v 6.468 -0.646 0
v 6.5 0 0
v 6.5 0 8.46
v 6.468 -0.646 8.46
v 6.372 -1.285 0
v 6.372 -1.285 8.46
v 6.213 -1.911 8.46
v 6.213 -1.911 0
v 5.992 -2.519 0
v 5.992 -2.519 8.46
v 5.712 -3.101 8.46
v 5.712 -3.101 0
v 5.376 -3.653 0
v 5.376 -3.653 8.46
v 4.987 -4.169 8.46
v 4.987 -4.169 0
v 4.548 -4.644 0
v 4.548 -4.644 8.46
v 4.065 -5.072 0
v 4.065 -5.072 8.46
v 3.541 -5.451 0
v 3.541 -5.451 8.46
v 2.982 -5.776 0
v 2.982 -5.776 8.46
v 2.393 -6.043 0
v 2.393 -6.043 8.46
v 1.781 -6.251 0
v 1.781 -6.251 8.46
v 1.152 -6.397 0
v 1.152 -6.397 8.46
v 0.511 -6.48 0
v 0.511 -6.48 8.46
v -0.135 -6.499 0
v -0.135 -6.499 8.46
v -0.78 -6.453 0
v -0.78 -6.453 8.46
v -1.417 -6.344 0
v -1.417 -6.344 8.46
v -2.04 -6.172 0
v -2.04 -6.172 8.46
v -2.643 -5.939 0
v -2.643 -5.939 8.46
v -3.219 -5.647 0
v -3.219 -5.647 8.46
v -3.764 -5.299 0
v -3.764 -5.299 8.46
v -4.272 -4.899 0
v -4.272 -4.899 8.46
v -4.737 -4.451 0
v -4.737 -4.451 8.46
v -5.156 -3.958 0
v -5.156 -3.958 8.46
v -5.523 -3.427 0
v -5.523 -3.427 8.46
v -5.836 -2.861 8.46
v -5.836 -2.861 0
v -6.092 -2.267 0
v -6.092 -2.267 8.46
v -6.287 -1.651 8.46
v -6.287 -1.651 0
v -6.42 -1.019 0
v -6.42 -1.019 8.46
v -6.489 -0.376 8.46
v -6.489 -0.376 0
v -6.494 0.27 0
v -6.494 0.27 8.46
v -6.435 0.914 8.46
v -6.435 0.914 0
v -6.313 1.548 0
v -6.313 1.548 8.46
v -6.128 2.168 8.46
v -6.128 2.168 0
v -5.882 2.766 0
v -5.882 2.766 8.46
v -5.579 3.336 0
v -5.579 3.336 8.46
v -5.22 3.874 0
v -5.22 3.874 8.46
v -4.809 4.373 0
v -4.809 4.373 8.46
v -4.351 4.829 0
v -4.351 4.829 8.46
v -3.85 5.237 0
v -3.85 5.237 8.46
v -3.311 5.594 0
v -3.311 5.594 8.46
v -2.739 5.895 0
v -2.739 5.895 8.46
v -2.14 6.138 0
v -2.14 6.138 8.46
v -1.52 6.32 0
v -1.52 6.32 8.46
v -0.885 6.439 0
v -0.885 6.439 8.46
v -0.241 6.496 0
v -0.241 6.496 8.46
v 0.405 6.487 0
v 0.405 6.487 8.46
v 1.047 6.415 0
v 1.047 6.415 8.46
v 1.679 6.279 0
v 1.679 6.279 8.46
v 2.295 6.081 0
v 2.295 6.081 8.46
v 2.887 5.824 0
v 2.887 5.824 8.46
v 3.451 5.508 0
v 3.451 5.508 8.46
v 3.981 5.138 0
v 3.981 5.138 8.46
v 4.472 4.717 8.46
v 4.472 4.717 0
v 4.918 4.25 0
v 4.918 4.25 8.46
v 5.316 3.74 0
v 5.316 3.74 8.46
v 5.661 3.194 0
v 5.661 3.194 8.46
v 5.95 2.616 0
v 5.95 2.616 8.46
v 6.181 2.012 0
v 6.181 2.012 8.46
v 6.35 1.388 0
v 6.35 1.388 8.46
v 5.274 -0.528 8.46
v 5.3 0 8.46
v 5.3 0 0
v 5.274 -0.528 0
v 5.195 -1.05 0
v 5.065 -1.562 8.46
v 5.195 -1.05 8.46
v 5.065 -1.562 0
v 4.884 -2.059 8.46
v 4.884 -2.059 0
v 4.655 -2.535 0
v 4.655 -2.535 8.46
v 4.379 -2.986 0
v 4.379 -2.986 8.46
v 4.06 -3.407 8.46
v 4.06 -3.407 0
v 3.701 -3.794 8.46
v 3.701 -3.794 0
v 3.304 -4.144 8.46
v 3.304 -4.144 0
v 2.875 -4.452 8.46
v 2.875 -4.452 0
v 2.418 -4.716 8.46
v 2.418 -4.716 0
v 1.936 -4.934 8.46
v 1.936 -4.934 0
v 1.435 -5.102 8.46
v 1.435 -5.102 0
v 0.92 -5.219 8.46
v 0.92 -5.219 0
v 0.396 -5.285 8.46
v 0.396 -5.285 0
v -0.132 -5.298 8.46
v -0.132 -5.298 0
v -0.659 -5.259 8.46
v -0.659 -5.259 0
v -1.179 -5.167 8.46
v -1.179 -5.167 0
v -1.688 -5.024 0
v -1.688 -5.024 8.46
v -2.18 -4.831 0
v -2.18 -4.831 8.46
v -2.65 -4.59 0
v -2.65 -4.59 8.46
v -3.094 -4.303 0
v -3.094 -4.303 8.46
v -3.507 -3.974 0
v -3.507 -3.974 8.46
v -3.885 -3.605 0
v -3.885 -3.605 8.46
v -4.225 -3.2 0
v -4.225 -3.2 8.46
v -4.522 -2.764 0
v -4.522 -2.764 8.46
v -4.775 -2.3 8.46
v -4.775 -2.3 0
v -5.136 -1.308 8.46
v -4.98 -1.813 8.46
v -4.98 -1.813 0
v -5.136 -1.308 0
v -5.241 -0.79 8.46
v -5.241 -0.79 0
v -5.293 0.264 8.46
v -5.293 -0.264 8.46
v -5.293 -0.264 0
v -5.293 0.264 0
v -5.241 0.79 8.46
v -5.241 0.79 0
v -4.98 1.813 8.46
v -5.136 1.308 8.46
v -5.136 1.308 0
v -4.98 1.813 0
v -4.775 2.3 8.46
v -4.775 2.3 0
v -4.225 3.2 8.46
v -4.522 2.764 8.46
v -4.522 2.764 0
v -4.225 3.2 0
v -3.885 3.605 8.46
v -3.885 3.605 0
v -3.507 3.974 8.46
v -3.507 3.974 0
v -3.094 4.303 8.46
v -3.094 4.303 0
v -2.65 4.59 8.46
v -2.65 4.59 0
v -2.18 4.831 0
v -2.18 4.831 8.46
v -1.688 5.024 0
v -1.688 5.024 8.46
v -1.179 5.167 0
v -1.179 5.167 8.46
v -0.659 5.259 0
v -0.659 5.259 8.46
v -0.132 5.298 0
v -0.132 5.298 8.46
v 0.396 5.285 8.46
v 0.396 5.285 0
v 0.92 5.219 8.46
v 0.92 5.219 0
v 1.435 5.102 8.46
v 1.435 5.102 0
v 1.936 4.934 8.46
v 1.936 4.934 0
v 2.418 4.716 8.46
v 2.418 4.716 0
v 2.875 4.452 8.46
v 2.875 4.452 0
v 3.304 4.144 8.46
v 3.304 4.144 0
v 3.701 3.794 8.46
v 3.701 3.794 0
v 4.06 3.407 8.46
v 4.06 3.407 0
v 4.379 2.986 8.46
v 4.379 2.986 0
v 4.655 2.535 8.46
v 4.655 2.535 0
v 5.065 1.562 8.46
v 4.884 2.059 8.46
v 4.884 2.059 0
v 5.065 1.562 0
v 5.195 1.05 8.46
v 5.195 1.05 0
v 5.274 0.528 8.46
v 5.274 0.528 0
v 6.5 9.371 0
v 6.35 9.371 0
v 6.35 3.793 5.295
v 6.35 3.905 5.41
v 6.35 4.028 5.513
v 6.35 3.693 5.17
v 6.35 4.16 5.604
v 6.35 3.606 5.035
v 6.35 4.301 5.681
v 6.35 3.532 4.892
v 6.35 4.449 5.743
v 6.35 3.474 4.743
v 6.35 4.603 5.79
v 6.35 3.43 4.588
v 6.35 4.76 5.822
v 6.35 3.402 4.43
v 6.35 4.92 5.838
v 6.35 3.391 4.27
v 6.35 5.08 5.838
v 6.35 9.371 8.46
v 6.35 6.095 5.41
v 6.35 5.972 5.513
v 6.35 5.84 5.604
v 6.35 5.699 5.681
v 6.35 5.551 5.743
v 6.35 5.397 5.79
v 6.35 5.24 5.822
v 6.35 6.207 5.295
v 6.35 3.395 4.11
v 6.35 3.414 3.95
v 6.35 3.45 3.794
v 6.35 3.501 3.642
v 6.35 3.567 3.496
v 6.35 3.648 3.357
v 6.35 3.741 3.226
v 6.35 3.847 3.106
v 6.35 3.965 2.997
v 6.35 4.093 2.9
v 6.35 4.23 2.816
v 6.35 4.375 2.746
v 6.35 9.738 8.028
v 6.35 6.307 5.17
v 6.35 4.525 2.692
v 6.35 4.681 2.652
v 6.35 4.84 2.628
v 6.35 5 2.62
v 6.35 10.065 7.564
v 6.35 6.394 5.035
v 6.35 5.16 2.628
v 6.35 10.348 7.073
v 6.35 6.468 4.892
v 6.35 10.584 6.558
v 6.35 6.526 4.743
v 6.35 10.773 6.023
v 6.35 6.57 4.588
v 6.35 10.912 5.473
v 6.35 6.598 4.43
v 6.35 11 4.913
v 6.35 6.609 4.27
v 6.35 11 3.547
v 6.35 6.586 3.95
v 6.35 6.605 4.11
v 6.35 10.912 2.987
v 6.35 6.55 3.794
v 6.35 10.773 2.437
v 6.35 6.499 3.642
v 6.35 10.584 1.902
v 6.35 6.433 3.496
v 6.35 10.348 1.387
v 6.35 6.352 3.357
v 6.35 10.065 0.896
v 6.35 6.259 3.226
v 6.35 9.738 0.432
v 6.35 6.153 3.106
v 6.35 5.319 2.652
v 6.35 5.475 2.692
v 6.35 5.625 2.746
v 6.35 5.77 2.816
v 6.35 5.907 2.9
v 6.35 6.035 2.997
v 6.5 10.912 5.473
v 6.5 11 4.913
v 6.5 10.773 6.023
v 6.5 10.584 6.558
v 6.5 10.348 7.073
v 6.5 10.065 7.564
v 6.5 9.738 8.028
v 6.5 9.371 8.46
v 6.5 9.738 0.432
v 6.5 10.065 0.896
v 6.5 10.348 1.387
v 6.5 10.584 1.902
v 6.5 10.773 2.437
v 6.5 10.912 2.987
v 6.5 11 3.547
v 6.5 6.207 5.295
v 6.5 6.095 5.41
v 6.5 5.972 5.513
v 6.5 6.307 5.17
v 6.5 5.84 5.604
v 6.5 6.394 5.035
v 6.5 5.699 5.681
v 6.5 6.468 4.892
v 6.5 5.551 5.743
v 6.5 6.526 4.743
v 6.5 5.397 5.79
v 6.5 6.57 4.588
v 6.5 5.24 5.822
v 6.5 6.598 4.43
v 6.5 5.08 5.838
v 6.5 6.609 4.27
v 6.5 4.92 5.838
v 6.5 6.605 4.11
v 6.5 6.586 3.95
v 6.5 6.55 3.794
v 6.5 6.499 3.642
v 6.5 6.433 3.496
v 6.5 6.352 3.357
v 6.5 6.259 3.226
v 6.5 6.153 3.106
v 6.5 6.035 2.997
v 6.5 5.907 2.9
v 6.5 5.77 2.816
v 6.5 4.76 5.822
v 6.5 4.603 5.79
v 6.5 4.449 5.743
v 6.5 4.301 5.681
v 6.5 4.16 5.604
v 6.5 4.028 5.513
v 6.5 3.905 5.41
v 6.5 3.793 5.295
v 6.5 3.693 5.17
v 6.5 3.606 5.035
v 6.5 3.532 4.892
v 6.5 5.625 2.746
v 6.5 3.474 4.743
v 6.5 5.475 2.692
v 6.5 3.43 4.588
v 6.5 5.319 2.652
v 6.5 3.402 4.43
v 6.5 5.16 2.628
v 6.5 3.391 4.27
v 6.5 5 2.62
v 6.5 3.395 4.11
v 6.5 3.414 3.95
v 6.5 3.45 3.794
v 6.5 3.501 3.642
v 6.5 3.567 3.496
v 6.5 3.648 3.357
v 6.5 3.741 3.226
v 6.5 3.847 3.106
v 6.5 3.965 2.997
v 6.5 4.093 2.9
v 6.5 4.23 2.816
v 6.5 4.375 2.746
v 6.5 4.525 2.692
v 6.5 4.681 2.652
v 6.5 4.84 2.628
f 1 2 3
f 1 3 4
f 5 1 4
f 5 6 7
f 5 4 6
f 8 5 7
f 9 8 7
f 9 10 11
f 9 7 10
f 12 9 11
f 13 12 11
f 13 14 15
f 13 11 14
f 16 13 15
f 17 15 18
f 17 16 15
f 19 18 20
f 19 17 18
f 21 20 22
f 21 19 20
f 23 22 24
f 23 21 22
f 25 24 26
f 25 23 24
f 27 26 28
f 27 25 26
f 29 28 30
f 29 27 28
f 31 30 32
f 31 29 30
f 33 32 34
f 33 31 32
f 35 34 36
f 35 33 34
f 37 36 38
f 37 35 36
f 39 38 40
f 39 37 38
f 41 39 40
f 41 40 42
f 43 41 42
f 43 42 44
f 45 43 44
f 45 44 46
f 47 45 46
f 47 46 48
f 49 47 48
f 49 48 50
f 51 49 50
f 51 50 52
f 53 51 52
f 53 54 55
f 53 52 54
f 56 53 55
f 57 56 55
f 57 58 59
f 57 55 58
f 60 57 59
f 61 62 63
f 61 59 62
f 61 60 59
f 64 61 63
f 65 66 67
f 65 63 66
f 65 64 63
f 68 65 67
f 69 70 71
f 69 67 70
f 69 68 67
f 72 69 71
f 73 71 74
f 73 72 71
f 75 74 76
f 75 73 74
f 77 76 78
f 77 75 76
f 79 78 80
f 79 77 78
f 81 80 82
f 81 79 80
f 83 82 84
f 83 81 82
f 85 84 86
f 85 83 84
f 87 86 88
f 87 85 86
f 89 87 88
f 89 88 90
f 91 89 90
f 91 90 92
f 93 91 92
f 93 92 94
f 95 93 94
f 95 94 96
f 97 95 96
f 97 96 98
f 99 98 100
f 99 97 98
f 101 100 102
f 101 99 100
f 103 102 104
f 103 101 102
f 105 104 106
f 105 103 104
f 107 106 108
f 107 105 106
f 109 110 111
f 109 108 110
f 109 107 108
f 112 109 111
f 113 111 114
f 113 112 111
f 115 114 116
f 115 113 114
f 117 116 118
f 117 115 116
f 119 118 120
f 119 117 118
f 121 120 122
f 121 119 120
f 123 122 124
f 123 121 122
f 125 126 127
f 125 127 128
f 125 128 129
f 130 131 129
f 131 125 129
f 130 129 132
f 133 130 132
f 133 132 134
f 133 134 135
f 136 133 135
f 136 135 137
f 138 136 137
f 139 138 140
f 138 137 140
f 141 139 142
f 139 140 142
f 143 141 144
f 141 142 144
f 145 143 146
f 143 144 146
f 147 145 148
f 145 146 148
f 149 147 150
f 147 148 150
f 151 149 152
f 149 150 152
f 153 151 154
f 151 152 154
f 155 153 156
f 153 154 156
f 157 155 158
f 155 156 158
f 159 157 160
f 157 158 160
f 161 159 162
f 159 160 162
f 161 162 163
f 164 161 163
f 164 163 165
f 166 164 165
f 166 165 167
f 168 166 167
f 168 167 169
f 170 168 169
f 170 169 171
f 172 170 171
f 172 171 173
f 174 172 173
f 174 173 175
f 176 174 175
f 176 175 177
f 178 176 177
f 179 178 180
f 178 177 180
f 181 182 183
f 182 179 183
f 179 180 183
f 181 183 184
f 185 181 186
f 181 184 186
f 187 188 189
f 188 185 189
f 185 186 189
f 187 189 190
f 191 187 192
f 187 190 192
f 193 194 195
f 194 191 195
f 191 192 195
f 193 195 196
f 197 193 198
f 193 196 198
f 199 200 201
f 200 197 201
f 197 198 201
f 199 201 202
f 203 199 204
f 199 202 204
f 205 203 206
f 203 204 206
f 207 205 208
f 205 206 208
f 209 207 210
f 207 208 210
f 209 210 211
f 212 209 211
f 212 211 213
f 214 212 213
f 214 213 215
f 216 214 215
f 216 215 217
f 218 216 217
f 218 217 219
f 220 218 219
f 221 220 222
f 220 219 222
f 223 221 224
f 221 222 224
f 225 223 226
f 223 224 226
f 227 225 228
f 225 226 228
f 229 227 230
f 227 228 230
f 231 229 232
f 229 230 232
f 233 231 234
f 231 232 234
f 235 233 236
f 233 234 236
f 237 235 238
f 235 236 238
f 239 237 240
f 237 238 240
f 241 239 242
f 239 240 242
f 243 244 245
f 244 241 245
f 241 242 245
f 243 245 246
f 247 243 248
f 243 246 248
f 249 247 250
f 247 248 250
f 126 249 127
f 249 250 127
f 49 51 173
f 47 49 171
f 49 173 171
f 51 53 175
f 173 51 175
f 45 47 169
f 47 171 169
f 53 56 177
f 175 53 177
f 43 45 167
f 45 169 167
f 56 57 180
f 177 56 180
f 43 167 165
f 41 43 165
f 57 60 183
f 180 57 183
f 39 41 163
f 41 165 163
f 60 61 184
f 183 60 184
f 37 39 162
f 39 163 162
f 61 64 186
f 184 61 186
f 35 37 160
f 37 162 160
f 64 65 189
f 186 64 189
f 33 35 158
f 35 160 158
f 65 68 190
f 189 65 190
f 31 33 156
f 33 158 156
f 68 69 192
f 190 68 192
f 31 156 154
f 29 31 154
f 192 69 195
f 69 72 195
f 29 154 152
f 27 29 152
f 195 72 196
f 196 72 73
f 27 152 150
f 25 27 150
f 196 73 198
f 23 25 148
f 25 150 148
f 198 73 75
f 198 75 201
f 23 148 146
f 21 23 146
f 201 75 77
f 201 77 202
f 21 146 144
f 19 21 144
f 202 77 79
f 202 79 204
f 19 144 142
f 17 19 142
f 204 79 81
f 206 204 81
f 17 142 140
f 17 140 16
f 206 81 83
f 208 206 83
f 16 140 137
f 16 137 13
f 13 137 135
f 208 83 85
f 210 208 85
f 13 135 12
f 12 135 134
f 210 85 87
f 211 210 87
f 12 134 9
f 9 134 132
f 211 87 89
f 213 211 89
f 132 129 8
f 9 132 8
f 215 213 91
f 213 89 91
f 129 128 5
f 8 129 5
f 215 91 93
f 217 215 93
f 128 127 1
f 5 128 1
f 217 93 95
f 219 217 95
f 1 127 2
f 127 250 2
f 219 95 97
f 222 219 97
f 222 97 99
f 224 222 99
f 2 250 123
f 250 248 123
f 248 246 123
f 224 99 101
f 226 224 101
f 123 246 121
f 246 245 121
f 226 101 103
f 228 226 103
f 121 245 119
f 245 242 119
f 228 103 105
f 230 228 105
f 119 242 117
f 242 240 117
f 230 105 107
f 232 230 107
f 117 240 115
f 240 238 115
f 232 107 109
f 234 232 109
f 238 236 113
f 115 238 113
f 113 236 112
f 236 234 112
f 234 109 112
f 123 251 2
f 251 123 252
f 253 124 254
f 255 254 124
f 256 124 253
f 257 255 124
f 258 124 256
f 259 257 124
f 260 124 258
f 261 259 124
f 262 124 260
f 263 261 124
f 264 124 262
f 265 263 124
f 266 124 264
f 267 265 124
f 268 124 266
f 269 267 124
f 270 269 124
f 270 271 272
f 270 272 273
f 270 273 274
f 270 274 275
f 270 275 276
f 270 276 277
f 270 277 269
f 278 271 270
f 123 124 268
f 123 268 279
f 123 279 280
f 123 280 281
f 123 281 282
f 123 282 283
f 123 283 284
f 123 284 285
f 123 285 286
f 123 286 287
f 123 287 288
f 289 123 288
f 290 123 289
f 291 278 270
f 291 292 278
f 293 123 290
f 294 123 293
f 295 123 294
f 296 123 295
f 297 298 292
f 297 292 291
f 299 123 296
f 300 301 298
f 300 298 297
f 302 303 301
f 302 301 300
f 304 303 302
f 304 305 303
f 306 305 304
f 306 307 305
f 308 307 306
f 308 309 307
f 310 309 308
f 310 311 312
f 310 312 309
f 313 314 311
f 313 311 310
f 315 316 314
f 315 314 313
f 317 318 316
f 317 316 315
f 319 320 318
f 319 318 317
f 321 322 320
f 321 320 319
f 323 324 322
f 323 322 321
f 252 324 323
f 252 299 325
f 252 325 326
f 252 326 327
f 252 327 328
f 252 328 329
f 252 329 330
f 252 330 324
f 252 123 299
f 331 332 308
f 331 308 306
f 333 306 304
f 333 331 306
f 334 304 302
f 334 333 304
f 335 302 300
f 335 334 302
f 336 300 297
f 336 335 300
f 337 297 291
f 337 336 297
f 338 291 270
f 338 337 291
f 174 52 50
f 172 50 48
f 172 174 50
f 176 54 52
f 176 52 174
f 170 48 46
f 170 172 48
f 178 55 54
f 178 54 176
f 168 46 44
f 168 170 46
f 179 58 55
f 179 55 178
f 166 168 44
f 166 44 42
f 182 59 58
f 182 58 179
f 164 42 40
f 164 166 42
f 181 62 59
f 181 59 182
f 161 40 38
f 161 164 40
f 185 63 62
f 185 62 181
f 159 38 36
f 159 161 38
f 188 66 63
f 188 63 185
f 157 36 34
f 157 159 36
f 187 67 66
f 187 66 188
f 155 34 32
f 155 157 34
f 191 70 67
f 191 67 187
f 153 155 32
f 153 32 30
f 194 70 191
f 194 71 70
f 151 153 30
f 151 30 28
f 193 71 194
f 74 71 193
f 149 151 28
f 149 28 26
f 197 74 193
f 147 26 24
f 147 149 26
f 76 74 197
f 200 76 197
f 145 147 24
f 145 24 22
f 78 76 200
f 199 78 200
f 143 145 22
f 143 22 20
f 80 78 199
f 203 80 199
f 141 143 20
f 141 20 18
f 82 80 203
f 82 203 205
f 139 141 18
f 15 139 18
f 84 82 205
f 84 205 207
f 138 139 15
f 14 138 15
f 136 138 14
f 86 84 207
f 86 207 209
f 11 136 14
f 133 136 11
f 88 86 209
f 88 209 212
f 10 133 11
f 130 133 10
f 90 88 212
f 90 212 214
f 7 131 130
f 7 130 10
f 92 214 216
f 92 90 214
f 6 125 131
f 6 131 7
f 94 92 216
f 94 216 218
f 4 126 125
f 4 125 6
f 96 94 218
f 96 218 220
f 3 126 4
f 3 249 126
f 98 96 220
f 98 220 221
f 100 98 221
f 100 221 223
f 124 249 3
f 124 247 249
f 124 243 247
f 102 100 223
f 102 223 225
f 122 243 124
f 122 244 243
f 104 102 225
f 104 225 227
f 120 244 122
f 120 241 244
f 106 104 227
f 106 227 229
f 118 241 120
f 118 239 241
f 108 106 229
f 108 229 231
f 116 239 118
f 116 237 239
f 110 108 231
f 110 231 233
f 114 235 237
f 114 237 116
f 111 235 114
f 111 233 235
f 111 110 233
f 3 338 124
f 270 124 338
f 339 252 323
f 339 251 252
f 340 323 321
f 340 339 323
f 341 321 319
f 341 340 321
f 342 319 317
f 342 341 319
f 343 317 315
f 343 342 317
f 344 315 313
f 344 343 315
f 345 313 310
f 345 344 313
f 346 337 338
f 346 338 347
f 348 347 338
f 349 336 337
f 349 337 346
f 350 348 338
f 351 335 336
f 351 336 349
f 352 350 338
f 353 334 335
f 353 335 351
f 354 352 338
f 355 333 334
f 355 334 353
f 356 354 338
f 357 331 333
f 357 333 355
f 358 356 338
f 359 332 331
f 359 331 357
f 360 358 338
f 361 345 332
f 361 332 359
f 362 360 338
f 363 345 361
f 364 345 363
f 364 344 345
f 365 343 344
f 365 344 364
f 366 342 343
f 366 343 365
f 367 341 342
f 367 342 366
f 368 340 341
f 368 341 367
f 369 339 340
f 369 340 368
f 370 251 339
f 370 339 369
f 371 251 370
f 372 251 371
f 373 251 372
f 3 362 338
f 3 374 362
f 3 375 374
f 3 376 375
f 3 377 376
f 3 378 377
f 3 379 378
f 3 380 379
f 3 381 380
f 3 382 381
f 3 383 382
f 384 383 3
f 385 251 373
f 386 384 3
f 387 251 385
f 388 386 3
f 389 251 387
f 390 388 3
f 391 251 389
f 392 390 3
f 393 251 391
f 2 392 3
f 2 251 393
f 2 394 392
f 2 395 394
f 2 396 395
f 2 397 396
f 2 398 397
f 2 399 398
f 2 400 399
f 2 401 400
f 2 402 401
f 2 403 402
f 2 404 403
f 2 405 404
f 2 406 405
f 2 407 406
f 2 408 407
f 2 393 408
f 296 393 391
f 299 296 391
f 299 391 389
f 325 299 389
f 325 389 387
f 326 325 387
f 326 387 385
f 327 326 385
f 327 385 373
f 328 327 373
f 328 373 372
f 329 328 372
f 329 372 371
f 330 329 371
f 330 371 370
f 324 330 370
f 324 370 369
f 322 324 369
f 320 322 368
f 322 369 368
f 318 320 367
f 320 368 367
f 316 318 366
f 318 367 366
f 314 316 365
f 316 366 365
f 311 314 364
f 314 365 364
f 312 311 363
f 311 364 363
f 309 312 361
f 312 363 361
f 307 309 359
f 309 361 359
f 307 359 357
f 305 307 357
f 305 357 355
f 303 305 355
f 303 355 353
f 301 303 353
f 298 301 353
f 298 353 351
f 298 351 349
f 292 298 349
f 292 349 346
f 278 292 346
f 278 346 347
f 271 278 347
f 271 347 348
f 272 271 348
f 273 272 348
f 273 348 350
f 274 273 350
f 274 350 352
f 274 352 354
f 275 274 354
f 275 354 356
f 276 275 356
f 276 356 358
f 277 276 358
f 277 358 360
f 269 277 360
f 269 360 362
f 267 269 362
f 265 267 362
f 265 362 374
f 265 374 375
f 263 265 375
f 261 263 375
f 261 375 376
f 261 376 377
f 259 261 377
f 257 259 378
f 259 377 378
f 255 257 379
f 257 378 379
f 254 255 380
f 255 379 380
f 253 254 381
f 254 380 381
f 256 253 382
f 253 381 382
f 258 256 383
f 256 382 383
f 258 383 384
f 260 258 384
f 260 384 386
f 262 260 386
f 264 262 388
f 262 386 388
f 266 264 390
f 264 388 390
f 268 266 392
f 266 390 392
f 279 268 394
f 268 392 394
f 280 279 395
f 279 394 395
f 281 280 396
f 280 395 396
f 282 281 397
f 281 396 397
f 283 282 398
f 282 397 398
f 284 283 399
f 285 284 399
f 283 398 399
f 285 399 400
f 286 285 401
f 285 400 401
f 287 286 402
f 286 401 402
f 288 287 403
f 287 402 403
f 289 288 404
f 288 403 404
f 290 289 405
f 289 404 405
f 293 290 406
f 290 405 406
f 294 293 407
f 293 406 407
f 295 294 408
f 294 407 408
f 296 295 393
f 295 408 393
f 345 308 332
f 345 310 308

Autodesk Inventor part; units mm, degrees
ref_plane "YZ Plane" through (0, 0, 0) normal (1, 0, 0) x (0, 1, 0)
ref_plane "XZ Plane" through (0, 0, 0) normal (0, 1, 0) x (-1, 0, 0)
ref_plane "XY Plane" through (0, 0, 0) normal (0, 0, 1) x (1, 0, 0)
sketch "Sketch1" plane through (0, 0, 0) normal (0, 0, 1) x (1, 0, 0)
  circle A0 centre (0, 0) radius 6.5
  line L0 (6.5, 0) -> (6.35, 0)
  line L1 (6.35, 0) -> (6.35, 11)
  line L2 (6.35, 11) -> (6.5, 11)
  line L3 (6.5, 11) -> (6.5, 0)
  circle A1 centre (0, 0) radius 5.3
  point P0 (6.35, 1.3883)
  dimension "d0" = 13
  dimension "d1" = 0.15
  dimension "d2" = 11
  dimension "d12" = 1.2
extrude "Extrusion1" add sketch "Sketch1" along normal blind 8.46
sketch "Sketch2" plane through (6.5, 0, 0) normal (1, 0, 0) x (0, 0, -1)
  circle A0 centre (-4.23, 5) radius 1.61
  line L0 (0, 0) -> (0, 11) projected
  line L1 (-8.46, 0) -> (-8.46, 11) projected
  arc A1 (0, 9.3706) -> (-8.46, 9.3706) centre (-4.23, 4.8377) ccw
  line L2 (-8.46, 0) -> (0, 0)
  line L3 (0, 6.5) -> (0, -6.5) projected
  line L4 (0, 0) -> (0, 11) projected
  line L5 (0, 11) -> (-8.46, 11) projected
  line L6 (-8.46, 0) -> (-8.46, 11) projected
  line L7 (0, 0) -> (-8.46, 0) projected
  point P0 (0, 1.3883)
  point P1 (-3.5473, 11)
  point P2 (-4.9127, 11)
  dimension "d5" = 5
  dimension "d6" = 3.22
  dimension "d8" = 4.23
  dimension "d9" = 6.2
extrude "Extrusion2" cut sketch "Sketch2" against normal up to surface (0.15 mm away) contours A0 | A1 L5 L0 | L1 L5 A1
properties part number "LCF 025 05 031S (on hub)" material "Brass, Soft Yellow"
